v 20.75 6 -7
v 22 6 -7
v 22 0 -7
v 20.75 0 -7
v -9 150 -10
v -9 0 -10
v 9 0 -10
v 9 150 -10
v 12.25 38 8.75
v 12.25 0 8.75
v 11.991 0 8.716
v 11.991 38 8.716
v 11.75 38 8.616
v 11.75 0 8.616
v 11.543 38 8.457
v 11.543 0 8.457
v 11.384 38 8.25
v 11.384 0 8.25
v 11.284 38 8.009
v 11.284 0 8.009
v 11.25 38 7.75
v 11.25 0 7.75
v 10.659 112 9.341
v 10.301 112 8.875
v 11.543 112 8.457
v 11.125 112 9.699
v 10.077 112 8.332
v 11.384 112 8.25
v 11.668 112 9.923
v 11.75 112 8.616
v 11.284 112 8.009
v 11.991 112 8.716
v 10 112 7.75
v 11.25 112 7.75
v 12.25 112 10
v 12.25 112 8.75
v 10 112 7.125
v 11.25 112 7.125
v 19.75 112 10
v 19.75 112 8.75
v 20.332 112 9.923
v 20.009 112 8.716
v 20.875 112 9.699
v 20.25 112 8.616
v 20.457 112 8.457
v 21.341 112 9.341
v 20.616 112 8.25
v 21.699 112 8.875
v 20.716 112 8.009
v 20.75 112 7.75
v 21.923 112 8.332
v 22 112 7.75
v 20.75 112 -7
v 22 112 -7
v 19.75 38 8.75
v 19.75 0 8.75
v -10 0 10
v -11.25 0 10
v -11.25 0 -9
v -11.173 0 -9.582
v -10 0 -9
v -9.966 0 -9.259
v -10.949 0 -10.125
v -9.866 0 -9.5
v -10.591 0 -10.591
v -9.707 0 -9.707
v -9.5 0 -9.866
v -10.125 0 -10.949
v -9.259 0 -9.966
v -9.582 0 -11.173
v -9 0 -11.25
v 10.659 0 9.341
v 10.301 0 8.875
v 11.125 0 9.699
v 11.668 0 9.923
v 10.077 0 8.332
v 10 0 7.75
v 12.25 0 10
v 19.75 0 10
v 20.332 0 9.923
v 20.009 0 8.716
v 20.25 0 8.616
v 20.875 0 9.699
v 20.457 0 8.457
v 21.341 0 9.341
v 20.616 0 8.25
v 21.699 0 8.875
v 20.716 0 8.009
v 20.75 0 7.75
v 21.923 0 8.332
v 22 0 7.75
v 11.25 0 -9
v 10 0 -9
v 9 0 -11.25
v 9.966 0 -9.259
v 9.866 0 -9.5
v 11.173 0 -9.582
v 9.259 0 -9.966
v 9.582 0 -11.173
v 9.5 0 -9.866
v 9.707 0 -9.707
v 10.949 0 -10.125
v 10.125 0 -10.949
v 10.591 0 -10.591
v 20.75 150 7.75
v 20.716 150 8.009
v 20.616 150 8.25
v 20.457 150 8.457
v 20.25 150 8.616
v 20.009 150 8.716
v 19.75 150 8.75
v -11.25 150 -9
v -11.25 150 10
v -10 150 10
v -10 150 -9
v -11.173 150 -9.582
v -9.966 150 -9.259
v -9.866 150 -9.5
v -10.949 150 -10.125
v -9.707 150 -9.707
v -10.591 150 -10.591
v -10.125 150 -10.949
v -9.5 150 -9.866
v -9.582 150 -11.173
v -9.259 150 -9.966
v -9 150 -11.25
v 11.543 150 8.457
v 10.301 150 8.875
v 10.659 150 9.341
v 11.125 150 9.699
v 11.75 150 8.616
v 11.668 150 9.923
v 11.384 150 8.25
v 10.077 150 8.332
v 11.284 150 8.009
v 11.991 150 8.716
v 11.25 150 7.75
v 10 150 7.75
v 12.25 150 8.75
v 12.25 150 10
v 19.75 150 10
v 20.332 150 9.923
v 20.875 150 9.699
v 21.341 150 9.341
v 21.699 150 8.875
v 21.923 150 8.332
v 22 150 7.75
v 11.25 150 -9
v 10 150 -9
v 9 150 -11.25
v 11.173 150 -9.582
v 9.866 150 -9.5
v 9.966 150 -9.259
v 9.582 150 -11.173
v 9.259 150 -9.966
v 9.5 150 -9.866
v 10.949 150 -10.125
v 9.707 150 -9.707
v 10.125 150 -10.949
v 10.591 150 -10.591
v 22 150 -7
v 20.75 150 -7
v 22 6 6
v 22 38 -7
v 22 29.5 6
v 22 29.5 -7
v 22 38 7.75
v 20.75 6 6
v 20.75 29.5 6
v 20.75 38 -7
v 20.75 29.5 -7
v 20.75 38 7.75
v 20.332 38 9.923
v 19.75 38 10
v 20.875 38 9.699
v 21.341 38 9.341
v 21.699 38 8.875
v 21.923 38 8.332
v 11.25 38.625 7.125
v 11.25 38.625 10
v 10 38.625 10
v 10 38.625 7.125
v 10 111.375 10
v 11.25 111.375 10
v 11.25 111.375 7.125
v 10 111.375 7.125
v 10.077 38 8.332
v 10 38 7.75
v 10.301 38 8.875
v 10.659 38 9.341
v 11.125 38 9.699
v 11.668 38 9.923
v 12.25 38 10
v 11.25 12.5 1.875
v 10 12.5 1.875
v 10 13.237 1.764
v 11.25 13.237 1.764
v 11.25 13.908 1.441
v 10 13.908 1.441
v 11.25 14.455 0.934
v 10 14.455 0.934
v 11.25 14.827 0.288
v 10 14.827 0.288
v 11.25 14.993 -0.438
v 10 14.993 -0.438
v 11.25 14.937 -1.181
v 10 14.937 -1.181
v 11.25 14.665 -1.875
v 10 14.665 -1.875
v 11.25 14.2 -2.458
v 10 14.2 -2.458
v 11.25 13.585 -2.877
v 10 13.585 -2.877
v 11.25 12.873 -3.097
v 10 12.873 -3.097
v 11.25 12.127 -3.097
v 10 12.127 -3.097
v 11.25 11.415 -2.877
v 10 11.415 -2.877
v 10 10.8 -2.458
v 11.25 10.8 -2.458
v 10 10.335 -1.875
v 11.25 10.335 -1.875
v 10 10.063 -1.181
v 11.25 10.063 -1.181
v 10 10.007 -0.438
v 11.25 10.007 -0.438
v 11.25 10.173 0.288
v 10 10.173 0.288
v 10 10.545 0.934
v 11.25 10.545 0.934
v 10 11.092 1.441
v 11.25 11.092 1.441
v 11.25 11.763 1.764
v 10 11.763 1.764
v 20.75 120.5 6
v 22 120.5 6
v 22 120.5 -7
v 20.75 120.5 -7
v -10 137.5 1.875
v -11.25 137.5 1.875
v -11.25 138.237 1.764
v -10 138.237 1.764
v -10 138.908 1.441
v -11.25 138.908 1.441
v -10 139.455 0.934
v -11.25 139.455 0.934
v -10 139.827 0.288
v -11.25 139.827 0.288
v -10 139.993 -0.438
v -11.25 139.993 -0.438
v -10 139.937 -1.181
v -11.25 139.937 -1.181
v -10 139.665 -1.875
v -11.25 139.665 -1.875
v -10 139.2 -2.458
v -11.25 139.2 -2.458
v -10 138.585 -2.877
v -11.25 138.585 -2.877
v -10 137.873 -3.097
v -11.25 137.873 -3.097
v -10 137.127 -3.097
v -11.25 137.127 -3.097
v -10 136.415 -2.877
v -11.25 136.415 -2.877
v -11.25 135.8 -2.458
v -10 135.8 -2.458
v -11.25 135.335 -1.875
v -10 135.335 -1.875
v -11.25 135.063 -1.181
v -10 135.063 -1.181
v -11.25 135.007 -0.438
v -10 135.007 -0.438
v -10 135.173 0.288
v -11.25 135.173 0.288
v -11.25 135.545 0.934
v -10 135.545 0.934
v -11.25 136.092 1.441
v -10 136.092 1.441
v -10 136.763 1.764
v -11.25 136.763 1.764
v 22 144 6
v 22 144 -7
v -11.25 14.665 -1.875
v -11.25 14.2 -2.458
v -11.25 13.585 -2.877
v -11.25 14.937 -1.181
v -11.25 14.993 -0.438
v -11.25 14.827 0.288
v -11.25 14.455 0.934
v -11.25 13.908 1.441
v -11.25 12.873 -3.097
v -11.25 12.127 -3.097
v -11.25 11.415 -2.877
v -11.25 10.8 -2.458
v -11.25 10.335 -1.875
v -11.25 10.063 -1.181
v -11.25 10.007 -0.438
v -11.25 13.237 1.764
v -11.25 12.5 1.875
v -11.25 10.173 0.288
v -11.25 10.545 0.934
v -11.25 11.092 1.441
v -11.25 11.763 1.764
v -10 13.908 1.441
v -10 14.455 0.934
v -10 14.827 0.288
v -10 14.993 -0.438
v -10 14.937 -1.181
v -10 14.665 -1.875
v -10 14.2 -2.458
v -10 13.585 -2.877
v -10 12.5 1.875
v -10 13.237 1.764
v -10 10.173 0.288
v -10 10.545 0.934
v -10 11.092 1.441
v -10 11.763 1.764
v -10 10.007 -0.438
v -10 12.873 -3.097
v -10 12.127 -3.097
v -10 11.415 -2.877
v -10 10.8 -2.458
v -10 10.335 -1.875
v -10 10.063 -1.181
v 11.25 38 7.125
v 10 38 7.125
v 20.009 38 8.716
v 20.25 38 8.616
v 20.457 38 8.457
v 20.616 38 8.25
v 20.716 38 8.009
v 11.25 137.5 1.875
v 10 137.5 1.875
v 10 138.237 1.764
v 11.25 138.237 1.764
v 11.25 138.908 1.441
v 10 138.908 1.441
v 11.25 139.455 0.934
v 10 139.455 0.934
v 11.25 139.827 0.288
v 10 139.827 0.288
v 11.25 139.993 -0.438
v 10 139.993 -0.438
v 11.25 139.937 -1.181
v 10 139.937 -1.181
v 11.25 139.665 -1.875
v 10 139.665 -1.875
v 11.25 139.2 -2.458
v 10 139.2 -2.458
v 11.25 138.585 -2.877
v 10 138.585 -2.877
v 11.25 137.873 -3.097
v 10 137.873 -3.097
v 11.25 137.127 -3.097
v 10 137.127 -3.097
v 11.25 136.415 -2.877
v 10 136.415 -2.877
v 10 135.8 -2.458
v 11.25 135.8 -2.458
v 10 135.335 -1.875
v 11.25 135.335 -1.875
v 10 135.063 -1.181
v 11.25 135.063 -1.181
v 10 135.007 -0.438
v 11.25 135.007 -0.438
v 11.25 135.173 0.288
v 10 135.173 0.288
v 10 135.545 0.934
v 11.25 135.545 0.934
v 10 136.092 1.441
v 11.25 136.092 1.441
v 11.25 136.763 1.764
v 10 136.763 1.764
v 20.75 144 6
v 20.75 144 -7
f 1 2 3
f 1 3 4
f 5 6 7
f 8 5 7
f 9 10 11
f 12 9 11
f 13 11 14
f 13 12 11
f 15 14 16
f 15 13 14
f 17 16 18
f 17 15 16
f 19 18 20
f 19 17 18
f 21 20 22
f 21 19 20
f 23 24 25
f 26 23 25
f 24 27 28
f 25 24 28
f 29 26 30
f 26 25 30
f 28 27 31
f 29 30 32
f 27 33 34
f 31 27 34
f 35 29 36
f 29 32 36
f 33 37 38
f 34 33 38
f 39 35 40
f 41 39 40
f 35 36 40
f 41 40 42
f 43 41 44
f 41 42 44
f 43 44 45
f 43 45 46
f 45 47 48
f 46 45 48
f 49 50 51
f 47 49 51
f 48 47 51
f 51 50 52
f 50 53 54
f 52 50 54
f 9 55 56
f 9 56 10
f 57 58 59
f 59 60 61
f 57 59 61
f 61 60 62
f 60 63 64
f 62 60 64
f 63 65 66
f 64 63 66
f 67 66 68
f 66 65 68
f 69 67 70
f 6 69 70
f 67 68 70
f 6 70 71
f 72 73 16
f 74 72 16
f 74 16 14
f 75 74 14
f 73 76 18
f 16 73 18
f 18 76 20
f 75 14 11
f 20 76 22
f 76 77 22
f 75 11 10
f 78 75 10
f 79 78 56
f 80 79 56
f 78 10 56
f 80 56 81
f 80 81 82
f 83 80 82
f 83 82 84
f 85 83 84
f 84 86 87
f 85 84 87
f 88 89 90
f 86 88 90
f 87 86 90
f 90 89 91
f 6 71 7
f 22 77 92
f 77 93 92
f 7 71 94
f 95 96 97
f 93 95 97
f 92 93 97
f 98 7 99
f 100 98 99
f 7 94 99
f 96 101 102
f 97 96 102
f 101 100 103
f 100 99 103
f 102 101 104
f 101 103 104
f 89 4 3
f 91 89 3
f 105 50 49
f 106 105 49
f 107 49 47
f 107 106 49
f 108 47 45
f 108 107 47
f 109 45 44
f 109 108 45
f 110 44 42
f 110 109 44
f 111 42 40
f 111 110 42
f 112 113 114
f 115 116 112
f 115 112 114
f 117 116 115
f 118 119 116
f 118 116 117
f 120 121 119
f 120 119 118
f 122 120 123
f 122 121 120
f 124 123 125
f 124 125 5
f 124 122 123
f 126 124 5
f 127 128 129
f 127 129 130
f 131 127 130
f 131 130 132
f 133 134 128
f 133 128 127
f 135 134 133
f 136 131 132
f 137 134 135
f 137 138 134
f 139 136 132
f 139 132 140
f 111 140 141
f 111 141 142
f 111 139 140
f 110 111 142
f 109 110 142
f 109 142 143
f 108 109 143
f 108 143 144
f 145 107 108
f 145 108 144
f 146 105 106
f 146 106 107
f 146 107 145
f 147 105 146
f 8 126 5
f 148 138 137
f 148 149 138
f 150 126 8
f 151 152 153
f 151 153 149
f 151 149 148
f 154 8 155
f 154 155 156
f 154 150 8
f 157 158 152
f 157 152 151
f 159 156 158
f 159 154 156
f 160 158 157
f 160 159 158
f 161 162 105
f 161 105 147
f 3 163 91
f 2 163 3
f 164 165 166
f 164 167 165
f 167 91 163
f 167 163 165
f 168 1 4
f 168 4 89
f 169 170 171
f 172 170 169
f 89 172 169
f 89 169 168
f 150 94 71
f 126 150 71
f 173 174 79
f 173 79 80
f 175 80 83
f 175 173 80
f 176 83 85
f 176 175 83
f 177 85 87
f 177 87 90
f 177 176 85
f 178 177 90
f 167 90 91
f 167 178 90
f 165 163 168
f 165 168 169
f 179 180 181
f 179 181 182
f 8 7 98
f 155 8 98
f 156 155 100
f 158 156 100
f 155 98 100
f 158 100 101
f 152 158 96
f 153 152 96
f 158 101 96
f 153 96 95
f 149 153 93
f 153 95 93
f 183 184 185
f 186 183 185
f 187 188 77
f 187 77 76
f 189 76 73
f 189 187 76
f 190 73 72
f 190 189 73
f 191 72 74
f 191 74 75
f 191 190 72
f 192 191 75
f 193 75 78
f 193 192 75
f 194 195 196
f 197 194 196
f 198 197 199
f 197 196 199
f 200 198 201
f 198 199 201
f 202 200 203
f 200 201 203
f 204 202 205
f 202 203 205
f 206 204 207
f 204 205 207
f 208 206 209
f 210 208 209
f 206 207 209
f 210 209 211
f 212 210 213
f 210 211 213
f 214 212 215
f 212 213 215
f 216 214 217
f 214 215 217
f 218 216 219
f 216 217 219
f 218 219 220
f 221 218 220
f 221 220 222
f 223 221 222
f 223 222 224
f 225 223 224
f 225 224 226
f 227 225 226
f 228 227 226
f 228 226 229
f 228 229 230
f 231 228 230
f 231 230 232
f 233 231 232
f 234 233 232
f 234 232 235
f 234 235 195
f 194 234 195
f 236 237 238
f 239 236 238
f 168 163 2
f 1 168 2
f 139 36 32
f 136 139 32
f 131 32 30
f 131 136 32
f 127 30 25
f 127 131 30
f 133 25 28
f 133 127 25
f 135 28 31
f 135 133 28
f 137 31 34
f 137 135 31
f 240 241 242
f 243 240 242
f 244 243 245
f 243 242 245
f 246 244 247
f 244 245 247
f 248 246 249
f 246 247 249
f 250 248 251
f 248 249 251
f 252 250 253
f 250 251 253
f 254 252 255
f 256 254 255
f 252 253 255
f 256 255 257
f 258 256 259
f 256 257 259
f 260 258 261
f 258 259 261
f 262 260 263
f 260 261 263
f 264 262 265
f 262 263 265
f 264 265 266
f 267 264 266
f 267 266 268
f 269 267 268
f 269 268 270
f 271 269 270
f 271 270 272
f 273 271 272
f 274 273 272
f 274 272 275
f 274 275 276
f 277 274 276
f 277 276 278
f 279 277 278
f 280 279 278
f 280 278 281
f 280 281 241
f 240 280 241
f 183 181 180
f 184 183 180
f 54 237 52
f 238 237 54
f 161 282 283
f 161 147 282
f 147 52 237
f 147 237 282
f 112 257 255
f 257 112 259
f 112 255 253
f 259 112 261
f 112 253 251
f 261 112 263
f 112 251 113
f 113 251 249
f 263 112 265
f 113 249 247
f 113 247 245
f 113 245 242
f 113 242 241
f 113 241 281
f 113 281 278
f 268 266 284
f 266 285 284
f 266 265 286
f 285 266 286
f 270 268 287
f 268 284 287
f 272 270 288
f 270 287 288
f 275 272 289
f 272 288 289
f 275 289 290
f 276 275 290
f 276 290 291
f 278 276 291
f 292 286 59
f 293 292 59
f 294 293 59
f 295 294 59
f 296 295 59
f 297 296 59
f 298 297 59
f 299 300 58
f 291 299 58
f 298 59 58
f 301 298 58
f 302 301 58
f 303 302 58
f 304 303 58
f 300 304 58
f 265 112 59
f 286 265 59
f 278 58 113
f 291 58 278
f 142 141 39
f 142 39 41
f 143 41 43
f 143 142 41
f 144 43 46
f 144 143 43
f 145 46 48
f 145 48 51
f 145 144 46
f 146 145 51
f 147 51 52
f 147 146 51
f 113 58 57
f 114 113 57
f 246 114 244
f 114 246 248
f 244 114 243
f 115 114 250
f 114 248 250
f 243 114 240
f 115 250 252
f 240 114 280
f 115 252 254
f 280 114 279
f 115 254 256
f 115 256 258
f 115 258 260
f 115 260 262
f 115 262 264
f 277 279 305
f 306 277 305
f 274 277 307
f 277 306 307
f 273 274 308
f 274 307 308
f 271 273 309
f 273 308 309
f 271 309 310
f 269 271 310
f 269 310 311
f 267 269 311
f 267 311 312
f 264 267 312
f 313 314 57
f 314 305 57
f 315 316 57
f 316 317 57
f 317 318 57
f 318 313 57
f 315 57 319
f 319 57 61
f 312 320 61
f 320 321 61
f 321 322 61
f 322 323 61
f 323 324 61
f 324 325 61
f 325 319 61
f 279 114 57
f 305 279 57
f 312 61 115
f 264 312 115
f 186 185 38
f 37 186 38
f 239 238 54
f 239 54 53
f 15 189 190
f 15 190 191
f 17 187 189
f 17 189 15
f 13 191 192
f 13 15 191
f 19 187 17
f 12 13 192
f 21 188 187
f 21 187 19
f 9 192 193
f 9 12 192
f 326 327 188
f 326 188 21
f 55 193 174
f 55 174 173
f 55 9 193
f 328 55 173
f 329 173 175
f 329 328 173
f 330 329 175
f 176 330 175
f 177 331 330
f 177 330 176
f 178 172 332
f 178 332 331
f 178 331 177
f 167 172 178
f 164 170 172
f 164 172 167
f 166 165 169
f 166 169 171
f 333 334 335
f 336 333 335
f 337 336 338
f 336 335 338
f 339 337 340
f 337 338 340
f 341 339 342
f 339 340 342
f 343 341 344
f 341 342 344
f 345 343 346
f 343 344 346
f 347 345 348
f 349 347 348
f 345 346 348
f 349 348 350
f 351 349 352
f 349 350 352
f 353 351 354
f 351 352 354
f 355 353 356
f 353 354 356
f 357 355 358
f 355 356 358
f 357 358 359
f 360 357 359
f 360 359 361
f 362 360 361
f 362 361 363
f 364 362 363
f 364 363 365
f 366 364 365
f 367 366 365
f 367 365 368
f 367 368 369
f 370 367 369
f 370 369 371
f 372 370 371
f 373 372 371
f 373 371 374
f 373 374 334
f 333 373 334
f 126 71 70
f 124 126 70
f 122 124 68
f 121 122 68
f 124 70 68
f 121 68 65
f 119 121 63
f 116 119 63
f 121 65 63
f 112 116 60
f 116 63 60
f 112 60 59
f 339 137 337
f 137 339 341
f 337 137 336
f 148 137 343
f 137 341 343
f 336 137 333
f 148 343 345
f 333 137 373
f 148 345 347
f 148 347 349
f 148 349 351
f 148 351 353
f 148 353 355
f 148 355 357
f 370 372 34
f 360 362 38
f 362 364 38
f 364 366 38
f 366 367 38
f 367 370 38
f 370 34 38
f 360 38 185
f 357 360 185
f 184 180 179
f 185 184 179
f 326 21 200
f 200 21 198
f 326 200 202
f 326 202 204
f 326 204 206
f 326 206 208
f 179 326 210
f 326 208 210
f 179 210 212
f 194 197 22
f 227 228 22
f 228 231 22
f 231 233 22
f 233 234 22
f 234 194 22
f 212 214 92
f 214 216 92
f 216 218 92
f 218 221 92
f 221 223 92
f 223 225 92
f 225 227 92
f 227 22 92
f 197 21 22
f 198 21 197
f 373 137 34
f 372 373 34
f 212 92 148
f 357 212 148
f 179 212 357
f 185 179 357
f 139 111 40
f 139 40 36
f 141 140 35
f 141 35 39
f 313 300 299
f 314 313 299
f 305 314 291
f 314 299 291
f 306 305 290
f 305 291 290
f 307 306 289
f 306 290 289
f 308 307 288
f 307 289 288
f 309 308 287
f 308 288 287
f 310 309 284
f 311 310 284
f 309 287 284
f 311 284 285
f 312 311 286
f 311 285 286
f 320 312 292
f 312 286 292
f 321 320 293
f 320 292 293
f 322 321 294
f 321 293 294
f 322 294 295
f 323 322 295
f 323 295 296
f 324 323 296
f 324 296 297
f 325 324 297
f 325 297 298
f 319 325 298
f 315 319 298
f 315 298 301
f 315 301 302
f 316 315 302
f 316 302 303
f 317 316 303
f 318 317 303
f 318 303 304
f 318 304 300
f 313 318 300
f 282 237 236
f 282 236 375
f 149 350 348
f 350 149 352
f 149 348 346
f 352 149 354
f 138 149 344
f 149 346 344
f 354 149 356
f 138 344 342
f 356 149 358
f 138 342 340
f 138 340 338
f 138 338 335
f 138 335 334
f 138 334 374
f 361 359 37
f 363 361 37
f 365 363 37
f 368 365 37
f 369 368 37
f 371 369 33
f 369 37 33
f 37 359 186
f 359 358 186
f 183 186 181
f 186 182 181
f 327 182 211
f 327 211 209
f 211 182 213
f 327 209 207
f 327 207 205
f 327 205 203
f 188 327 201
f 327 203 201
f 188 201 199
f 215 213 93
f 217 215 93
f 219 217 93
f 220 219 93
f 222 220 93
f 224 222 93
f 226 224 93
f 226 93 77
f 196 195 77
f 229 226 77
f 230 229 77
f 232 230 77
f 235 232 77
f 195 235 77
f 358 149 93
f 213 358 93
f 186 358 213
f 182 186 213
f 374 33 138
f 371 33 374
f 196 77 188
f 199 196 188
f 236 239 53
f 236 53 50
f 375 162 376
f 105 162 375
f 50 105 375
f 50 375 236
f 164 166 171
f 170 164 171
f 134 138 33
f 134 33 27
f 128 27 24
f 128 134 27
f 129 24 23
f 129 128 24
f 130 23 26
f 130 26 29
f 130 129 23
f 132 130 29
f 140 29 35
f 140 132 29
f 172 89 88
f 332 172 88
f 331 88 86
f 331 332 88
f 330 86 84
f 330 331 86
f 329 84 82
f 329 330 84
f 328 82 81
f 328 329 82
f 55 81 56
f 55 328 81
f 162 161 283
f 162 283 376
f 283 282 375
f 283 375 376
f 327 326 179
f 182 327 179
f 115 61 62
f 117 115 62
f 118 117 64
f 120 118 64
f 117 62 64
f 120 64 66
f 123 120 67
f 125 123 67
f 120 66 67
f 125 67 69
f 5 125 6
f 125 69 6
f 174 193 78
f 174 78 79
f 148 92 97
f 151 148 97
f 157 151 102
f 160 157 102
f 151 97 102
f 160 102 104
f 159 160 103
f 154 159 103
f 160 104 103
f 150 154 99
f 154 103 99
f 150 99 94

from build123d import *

# Parameters (mm, degrees)
BASE_FLANGE1_DEPTH            = 150
CUT_EXTRUDE1_REACH            = 154.095
SKETCH7_R                     = 2.5
EDGE_FLANGE1_STRIP_W          = 7
EDGE_FLANGE1_STRIP_H          = 1.25
EDGE_FLANGE1_STRIP_CUT_DEPTH  = 38
EDGE_FLANGE1_RELIEF_W         = 7.625
EDGE_FLANGE1_RELIEF_H         = 0.625
EDGE_FLANGE1_RELIEF_CUT_DEPTH = 1.25
EDGE_FLANGE1_DEPTH            = 38
EDGE_FLANGE2_STRIP_W          = 7
EDGE_FLANGE2_STRIP_H          = 1.25
EDGE_FLANGE2_STRIP_CUT_DEPTH  = 38
EDGE_FLANGE2_DEPTH            = 38
SKETCH14_W                    = 13
SKETCH14_H                    = 23.5
CUT_EXTRUDE2_DEPTH            = 1.25
EDGE_FLANGE3_STRIP_W          = 7
EDGE_FLANGE3_STRIP_H          = 1.25
EDGE_FLANGE3_STRIP_CUT_DEPTH  = 38
EDGE_FLANGE3_RELIEF_W         = 7.625
EDGE_FLANGE3_RELIEF_H         = 0.625
EDGE_FLANGE3_RELIEF_CUT_DEPTH = 1.25
EDGE_FLANGE3_DEPTH            = 38
EDGE_FLANGE4_STRIP_W          = 7
EDGE_FLANGE4_STRIP_H          = 1.25
EDGE_FLANGE4_STRIP_CUT_DEPTH  = 38
EDGE_FLANGE4_DEPTH            = 38
SKETCH21_W                    = 13
SKETCH21_H                    = 23.5
CUT_EXTRUDE3_DEPTH            = 1.25


# Sheet-metal steps are written as plain solids
with BuildPart() as part:
    # Sketch2 → Base-Flange1 (new body)
    with BuildSketch(Plane(origin=(0, 0, 0), x_dir=(1, 0, 0), z_dir=(0, 1, 0))):
        with BuildLine():
            Line((-10, -10), (-10, 9))
            ThreePointArc((-10, 9), (-9.707106781, 9.707106781), (-9, 10))
            Line((-9, 10), (9, 10))
            ThreePointArc((9, 10), (9.707106781, 9.707106781), (10, 9))
            Line((10, 9), (10, -10))
            Line((10, -10), (11.25, -10))
            Line((11.25, -10), (11.25, 9))
            ThreePointArc((11.25, 9), (10.590990258, 10.590990258), (9, 11.25))
            Line((9, 11.25), (-9, 11.25))
            ThreePointArc((-9, 11.25), (-10.590990258, 10.590990258), (-11.25, 9))
            Line((-11.25, 9), (-11.25, -10))
            Line((-11.25, -10), (-10, -10))
        make_face()
    extrude(amount=BASE_FLANGE1_DEPTH)

    # Cut-Extrude1: up to this face of the body (flat: up to its plane)
    cut_extrude1_end = Plane(part.part.faces().sort_by_distance((11.25, 75, 0.5))[0])
    # Sketch7 → Cut-Extrude1 (cut, up to the picked face)
    with BuildSketch(Plane.ZY.offset(11.25), mode=Mode.PRIVATE) as cut_extrude1_sk1:
        with Locations((-0.625, 12.5)):
            Circle(SKETCH7_R)
    cut_extrude1_tool1 = split(extrude(cut_extrude1_sk1.sketch, amount=-CUT_EXTRUDE1_REACH, mode=Mode.PRIVATE), bisect_by=cut_extrude1_end, keep=Keep.BOTH, mode=Mode.PRIVATE)
    # Sketch7 → Cut-Extrude1 (cut, up to the picked face)
    with BuildSketch(Plane.ZY.offset(11.25), mode=Mode.PRIVATE) as cut_extrude1_sk2:
        with Locations((-0.625, 137.5)):
            Circle(SKETCH7_R)
    cut_extrude1_tool2 = split(extrude(cut_extrude1_sk2.sketch, amount=-CUT_EXTRUDE1_REACH, mode=Mode.PRIVATE), bisect_by=cut_extrude1_end, keep=Keep.BOTH, mode=Mode.PRIVATE)
    add(cut_extrude1_tool1.solids().sort_by(Axis((-11.25, 12.5, -0.625), (1, 0, 0)))[0], mode=Mode.SUBTRACT)
    add(cut_extrude1_tool2.solids().sort_by(Axis((-11.25, 137.5, -0.625), (1, 0, 0)))[0], mode=Mode.SUBTRACT)

    # Edge-Flange1 strip (across the edge) → Edge-Flange1 strip cut (cut)
    with BuildSketch(Plane(origin=(11.25, 38, 10), x_dir=(0, 0, -1), z_dir=(0, -1, 0))):
        with Locations((-1.25, -0.625)):
            Rectangle(EDGE_FLANGE1_STRIP_W, EDGE_FLANGE1_STRIP_H)
    extrude(amount=EDGE_FLANGE1_STRIP_CUT_DEPTH, mode=Mode.SUBTRACT)

    # Edge-Flange1 relief (on the sheet) → Edge-Flange1 relief cut (cut)
    with BuildSketch(Plane(origin=(11.25, 38, 7.75), x_dir=(0, 0, -1), z_dir=(1, 0, 0))):
        with Locations((-3.1875, 0.3125)):
            Rectangle(EDGE_FLANGE1_RELIEF_W, EDGE_FLANGE1_RELIEF_H)
    extrude(amount=-EDGE_FLANGE1_RELIEF_CUT_DEPTH, mode=Mode.SUBTRACT)

    # Edge-Flange1 section (across the edge) → Edge-Flange1 (add)
    with BuildSketch(Plane(origin=(11.25, 38, 10), x_dir=(0, 0, -1), z_dir=(0, -1, 0))):
        with BuildLine():
            Line((0, 1), (0, 10.75))
            Line((0, 10.75), (1.25, 10.75))
            Line((1.25, 10.75), (1.25, 1))
            ThreePointArc((1.25, 1), (1.542893219, 0.292893219), (2.25, 0))
            Line((2.25, 0), (2.25, -1.25))
            ThreePointArc((2.25, -1.25), (0.659009742, -0.590990258), (0, 1))
        make_face()
    extrude(amount=EDGE_FLANGE1_DEPTH)

    # Edge-Flange2 strip (across the edge) → Edge-Flange2 strip cut (cut)
    with BuildSketch(Plane(origin=(22, 38, 8.75), x_dir=(-1, 0, 0), z_dir=(0, -1, 0))):
        with Locations((-1.25, -0.625)):
            Rectangle(EDGE_FLANGE2_STRIP_W, EDGE_FLANGE2_STRIP_H)
    extrude(amount=EDGE_FLANGE2_STRIP_CUT_DEPTH, mode=Mode.SUBTRACT)

    # Edge-Flange2 section (across the edge) → Edge-Flange2 (add)
    with BuildSketch(Plane(origin=(22, 38, 8.75), x_dir=(-1, 0, 0), z_dir=(0, -1, 0))):
        with BuildLine():
            Line((0, 1), (0, 15.75))
            Line((0, 15.75), (1.25, 15.75))
            Line((1.25, 15.75), (1.25, 1))
            ThreePointArc((1.25, 1), (1.542893219, 0.292893219), (2.25, 0))
            Line((2.25, 0), (2.25, -1.25))
            ThreePointArc((2.25, -1.25), (0.659009742, -0.590990258), (0, 1))
        make_face()
    extrude(amount=EDGE_FLANGE2_DEPTH)

    # Sketch14 → Cut-Extrude2 (cut)
    with BuildSketch(Plane(origin=(22, 0, 0), x_dir=(0, 0, -1), z_dir=(1, 0, 0))):
        with Locations((0.5, 17.75)):
            Rectangle(SKETCH14_W, SKETCH14_H)
    extrude(amount=-CUT_EXTRUDE2_DEPTH, mode=Mode.SUBTRACT)

    # Edge-Flange3 strip (across the edge) → Edge-Flange3 strip cut (cut)
    with BuildSketch(Plane(origin=(11.25, 150, 10), x_dir=(0, 0, -1), z_dir=(0, -1, 0))):
        with Locations((-1.25, -0.625)):
            Rectangle(EDGE_FLANGE3_STRIP_W, EDGE_FLANGE3_STRIP_H)
    extrude(amount=EDGE_FLANGE3_STRIP_CUT_DEPTH, mode=Mode.SUBTRACT)

    # Edge-Flange3 relief (on the sheet) → Edge-Flange3 relief cut (cut)
    with BuildSketch(Plane(origin=(11.25, 150, 7.75), x_dir=(0, 0, -1), z_dir=(1, 0, 0))):
        with Locations((-3.1875, -38.3125)):
            Rectangle(EDGE_FLANGE3_RELIEF_W, EDGE_FLANGE3_RELIEF_H)
    extrude(amount=-EDGE_FLANGE3_RELIEF_CUT_DEPTH, mode=Mode.SUBTRACT)

    # Edge-Flange3 section (across the edge) → Edge-Flange3 (add)
    with BuildSketch(Plane(origin=(11.25, 150, 10), x_dir=(0, 0, -1), z_dir=(0, -1, 0))):
        with BuildLine():
            Line((0, 1), (0, 10.75))
            Line((0, 10.75), (1.25, 10.75))
            Line((1.25, 10.75), (1.25, 1))
            ThreePointArc((1.25, 1), (1.542893219, 0.292893219), (2.25, 0))
            Line((2.25, 0), (2.25, -1.25))
            ThreePointArc((2.25, -1.25), (0.659009742, -0.590990258), (0, 1))
        make_face()
    extrude(amount=EDGE_FLANGE3_DEPTH)

    # Edge-Flange4 strip (across the edge) → Edge-Flange4 strip cut (cut)
    with BuildSketch(Plane(origin=(22, 150, 8.75), x_dir=(-1, 0, 0), z_dir=(0, -1, 0))):
        with Locations((-1.25, -0.625)):
            Rectangle(EDGE_FLANGE4_STRIP_W, EDGE_FLANGE4_STRIP_H)
    extrude(amount=EDGE_FLANGE4_STRIP_CUT_DEPTH, mode=Mode.SUBTRACT)

    # Edge-Flange4 section (across the edge) → Edge-Flange4 (add)
    with BuildSketch(Plane(origin=(22, 150, 8.75), x_dir=(-1, 0, 0), z_dir=(0, -1, 0))):
        with BuildLine():
            Line((0, 1), (0, 15.75))
            Line((0, 15.75), (1.25, 15.75))
            Line((1.25, 15.75), (1.25, 1))
            ThreePointArc((1.25, 1), (1.542893219, 0.292893219), (2.25, 0))
            Line((2.25, 0), (2.25, -1.25))
            ThreePointArc((2.25, -1.25), (0.659009742, -0.590990258), (0, 1))
        make_face()
    extrude(amount=EDGE_FLANGE4_DEPTH)

    # Sketch21 → Cut-Extrude3 (cut)
    with BuildSketch(Plane(origin=(22, 0, 0), x_dir=(0, 0, -1), z_dir=(1, 0, 0))):
        with Locations((0.5, 132.25)):
            Rectangle(SKETCH21_W, SKETCH21_H)
    extrude(amount=-CUT_EXTRUDE3_DEPTH, mode=Mode.SUBTRACT)


solid = part.part
